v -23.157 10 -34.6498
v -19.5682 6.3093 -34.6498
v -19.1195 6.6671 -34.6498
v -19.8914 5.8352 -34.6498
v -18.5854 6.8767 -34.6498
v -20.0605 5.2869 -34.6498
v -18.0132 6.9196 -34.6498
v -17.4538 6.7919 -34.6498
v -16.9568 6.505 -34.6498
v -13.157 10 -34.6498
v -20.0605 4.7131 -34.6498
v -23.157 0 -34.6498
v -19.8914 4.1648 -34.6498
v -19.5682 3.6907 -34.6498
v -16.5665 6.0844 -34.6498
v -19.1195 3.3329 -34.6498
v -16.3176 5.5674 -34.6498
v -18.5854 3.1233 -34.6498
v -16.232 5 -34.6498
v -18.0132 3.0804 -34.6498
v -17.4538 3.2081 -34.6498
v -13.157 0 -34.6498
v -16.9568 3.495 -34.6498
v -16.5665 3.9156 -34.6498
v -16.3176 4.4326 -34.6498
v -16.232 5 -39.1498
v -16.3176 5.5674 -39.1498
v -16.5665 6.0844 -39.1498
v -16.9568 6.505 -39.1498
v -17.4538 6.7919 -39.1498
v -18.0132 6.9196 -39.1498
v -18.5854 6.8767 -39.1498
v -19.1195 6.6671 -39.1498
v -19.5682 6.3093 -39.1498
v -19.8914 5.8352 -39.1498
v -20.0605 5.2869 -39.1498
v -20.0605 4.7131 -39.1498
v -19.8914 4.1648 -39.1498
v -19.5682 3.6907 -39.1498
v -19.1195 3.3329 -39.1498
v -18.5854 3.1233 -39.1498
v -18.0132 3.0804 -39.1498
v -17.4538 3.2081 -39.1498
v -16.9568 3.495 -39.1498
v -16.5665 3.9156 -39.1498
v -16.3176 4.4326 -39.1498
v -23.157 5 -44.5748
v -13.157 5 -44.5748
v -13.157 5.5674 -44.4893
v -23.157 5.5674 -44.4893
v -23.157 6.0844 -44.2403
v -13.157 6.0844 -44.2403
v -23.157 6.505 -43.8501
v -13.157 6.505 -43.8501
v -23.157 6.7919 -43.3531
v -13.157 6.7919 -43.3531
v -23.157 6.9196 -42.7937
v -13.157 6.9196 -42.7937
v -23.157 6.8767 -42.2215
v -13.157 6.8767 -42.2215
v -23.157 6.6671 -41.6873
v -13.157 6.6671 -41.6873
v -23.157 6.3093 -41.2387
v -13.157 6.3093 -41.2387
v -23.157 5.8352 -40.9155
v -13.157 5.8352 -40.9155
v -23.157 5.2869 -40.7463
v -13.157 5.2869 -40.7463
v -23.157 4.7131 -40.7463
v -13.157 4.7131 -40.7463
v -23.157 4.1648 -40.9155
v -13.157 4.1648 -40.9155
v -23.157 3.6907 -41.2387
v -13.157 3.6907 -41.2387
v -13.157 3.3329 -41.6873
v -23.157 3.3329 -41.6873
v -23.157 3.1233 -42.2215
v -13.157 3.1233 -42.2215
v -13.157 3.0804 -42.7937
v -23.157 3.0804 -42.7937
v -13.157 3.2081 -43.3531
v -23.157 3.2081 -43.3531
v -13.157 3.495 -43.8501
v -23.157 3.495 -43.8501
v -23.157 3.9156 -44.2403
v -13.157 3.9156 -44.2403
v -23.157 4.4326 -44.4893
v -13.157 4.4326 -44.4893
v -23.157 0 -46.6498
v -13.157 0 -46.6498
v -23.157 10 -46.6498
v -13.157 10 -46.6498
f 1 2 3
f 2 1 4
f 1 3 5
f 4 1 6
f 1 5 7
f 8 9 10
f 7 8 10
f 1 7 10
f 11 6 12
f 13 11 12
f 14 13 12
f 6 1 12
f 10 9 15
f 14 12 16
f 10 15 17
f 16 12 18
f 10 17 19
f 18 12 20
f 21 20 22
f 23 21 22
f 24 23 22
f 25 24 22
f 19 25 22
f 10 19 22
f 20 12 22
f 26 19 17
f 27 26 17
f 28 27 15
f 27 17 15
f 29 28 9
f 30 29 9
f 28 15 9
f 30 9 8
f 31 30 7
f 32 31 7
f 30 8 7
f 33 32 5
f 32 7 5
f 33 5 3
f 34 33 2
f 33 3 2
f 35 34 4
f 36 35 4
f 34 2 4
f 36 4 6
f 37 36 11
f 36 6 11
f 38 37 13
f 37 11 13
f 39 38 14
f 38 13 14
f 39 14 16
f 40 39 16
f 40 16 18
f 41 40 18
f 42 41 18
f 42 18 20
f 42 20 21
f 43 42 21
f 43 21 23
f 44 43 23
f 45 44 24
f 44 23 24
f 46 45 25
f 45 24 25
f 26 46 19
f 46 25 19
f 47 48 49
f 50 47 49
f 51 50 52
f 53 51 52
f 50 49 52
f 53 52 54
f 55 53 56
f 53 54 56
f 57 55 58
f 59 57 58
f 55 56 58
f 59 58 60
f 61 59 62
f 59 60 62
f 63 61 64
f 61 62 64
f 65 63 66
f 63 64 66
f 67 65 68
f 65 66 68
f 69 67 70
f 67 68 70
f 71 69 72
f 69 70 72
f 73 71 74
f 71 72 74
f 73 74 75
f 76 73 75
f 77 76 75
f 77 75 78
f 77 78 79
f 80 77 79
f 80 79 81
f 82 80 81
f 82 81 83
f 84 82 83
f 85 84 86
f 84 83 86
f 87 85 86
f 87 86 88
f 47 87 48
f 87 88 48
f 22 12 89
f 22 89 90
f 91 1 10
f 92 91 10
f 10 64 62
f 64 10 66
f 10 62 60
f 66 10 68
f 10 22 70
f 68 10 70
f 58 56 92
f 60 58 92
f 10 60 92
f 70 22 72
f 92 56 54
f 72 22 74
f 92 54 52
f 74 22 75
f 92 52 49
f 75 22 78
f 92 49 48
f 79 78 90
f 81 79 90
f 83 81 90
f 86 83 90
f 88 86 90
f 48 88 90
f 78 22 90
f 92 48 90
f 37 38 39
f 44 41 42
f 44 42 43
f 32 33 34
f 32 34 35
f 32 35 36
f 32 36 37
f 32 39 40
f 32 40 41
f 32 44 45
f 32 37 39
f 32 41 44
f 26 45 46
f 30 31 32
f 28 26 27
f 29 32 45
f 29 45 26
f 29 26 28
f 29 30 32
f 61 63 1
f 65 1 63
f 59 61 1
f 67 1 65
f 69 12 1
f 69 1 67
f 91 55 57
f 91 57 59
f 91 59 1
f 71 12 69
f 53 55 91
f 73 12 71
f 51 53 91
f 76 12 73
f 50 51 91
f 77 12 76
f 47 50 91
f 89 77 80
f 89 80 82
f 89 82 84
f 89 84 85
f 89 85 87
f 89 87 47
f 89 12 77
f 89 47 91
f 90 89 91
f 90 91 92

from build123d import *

# Parameters (mm, degrees)
SKETCH2_W           = 10
SKETCH2_H           = 12
BOSS_EXTRUDE1_DEPTH = 10
SKETCH3_R           = 1.925
CUT_EXTRUDE1_DEPTH  = 4.5
SKETCH4_R           = 1.925
CUT_EXTRUDE2_DEPTH  = 10


with BuildPart() as part:
    # Sketch2 → Boss-Extrude1 (new body)
    with BuildSketch(Plane(origin=(0, 0, 0), x_dir=(1, 0, 0), z_dir=(0, 1, 0))):
        with Locations((-18.157041848, 40.649833306)):
            Rectangle(SKETCH2_W, SKETCH2_H)
    extrude(amount=BOSS_EXTRUDE1_DEPTH)

    # Sketch3 → Cut-Extrude1 (cut)
    with BuildSketch(Plane.XY.offset(-34.649833306)):
        with Locations((-18.157041848, 5)):
            Circle(SKETCH3_R)
    extrude(amount=-CUT_EXTRUDE1_DEPTH, mode=Mode.SUBTRACT)

    # Sketch4 → Cut-Extrude2 (cut)
    with BuildSketch(Plane(origin=(-13.157041848, 0, 0), x_dir=(0, 0, -1), z_dir=(1, 0, 0))):
        with Locations((42.649833306, 5)):
            Circle(SKETCH4_R)
    extrude(amount=-CUT_EXTRUDE2_DEPTH, mode=Mode.SUBTRACT)


solid = part.part
